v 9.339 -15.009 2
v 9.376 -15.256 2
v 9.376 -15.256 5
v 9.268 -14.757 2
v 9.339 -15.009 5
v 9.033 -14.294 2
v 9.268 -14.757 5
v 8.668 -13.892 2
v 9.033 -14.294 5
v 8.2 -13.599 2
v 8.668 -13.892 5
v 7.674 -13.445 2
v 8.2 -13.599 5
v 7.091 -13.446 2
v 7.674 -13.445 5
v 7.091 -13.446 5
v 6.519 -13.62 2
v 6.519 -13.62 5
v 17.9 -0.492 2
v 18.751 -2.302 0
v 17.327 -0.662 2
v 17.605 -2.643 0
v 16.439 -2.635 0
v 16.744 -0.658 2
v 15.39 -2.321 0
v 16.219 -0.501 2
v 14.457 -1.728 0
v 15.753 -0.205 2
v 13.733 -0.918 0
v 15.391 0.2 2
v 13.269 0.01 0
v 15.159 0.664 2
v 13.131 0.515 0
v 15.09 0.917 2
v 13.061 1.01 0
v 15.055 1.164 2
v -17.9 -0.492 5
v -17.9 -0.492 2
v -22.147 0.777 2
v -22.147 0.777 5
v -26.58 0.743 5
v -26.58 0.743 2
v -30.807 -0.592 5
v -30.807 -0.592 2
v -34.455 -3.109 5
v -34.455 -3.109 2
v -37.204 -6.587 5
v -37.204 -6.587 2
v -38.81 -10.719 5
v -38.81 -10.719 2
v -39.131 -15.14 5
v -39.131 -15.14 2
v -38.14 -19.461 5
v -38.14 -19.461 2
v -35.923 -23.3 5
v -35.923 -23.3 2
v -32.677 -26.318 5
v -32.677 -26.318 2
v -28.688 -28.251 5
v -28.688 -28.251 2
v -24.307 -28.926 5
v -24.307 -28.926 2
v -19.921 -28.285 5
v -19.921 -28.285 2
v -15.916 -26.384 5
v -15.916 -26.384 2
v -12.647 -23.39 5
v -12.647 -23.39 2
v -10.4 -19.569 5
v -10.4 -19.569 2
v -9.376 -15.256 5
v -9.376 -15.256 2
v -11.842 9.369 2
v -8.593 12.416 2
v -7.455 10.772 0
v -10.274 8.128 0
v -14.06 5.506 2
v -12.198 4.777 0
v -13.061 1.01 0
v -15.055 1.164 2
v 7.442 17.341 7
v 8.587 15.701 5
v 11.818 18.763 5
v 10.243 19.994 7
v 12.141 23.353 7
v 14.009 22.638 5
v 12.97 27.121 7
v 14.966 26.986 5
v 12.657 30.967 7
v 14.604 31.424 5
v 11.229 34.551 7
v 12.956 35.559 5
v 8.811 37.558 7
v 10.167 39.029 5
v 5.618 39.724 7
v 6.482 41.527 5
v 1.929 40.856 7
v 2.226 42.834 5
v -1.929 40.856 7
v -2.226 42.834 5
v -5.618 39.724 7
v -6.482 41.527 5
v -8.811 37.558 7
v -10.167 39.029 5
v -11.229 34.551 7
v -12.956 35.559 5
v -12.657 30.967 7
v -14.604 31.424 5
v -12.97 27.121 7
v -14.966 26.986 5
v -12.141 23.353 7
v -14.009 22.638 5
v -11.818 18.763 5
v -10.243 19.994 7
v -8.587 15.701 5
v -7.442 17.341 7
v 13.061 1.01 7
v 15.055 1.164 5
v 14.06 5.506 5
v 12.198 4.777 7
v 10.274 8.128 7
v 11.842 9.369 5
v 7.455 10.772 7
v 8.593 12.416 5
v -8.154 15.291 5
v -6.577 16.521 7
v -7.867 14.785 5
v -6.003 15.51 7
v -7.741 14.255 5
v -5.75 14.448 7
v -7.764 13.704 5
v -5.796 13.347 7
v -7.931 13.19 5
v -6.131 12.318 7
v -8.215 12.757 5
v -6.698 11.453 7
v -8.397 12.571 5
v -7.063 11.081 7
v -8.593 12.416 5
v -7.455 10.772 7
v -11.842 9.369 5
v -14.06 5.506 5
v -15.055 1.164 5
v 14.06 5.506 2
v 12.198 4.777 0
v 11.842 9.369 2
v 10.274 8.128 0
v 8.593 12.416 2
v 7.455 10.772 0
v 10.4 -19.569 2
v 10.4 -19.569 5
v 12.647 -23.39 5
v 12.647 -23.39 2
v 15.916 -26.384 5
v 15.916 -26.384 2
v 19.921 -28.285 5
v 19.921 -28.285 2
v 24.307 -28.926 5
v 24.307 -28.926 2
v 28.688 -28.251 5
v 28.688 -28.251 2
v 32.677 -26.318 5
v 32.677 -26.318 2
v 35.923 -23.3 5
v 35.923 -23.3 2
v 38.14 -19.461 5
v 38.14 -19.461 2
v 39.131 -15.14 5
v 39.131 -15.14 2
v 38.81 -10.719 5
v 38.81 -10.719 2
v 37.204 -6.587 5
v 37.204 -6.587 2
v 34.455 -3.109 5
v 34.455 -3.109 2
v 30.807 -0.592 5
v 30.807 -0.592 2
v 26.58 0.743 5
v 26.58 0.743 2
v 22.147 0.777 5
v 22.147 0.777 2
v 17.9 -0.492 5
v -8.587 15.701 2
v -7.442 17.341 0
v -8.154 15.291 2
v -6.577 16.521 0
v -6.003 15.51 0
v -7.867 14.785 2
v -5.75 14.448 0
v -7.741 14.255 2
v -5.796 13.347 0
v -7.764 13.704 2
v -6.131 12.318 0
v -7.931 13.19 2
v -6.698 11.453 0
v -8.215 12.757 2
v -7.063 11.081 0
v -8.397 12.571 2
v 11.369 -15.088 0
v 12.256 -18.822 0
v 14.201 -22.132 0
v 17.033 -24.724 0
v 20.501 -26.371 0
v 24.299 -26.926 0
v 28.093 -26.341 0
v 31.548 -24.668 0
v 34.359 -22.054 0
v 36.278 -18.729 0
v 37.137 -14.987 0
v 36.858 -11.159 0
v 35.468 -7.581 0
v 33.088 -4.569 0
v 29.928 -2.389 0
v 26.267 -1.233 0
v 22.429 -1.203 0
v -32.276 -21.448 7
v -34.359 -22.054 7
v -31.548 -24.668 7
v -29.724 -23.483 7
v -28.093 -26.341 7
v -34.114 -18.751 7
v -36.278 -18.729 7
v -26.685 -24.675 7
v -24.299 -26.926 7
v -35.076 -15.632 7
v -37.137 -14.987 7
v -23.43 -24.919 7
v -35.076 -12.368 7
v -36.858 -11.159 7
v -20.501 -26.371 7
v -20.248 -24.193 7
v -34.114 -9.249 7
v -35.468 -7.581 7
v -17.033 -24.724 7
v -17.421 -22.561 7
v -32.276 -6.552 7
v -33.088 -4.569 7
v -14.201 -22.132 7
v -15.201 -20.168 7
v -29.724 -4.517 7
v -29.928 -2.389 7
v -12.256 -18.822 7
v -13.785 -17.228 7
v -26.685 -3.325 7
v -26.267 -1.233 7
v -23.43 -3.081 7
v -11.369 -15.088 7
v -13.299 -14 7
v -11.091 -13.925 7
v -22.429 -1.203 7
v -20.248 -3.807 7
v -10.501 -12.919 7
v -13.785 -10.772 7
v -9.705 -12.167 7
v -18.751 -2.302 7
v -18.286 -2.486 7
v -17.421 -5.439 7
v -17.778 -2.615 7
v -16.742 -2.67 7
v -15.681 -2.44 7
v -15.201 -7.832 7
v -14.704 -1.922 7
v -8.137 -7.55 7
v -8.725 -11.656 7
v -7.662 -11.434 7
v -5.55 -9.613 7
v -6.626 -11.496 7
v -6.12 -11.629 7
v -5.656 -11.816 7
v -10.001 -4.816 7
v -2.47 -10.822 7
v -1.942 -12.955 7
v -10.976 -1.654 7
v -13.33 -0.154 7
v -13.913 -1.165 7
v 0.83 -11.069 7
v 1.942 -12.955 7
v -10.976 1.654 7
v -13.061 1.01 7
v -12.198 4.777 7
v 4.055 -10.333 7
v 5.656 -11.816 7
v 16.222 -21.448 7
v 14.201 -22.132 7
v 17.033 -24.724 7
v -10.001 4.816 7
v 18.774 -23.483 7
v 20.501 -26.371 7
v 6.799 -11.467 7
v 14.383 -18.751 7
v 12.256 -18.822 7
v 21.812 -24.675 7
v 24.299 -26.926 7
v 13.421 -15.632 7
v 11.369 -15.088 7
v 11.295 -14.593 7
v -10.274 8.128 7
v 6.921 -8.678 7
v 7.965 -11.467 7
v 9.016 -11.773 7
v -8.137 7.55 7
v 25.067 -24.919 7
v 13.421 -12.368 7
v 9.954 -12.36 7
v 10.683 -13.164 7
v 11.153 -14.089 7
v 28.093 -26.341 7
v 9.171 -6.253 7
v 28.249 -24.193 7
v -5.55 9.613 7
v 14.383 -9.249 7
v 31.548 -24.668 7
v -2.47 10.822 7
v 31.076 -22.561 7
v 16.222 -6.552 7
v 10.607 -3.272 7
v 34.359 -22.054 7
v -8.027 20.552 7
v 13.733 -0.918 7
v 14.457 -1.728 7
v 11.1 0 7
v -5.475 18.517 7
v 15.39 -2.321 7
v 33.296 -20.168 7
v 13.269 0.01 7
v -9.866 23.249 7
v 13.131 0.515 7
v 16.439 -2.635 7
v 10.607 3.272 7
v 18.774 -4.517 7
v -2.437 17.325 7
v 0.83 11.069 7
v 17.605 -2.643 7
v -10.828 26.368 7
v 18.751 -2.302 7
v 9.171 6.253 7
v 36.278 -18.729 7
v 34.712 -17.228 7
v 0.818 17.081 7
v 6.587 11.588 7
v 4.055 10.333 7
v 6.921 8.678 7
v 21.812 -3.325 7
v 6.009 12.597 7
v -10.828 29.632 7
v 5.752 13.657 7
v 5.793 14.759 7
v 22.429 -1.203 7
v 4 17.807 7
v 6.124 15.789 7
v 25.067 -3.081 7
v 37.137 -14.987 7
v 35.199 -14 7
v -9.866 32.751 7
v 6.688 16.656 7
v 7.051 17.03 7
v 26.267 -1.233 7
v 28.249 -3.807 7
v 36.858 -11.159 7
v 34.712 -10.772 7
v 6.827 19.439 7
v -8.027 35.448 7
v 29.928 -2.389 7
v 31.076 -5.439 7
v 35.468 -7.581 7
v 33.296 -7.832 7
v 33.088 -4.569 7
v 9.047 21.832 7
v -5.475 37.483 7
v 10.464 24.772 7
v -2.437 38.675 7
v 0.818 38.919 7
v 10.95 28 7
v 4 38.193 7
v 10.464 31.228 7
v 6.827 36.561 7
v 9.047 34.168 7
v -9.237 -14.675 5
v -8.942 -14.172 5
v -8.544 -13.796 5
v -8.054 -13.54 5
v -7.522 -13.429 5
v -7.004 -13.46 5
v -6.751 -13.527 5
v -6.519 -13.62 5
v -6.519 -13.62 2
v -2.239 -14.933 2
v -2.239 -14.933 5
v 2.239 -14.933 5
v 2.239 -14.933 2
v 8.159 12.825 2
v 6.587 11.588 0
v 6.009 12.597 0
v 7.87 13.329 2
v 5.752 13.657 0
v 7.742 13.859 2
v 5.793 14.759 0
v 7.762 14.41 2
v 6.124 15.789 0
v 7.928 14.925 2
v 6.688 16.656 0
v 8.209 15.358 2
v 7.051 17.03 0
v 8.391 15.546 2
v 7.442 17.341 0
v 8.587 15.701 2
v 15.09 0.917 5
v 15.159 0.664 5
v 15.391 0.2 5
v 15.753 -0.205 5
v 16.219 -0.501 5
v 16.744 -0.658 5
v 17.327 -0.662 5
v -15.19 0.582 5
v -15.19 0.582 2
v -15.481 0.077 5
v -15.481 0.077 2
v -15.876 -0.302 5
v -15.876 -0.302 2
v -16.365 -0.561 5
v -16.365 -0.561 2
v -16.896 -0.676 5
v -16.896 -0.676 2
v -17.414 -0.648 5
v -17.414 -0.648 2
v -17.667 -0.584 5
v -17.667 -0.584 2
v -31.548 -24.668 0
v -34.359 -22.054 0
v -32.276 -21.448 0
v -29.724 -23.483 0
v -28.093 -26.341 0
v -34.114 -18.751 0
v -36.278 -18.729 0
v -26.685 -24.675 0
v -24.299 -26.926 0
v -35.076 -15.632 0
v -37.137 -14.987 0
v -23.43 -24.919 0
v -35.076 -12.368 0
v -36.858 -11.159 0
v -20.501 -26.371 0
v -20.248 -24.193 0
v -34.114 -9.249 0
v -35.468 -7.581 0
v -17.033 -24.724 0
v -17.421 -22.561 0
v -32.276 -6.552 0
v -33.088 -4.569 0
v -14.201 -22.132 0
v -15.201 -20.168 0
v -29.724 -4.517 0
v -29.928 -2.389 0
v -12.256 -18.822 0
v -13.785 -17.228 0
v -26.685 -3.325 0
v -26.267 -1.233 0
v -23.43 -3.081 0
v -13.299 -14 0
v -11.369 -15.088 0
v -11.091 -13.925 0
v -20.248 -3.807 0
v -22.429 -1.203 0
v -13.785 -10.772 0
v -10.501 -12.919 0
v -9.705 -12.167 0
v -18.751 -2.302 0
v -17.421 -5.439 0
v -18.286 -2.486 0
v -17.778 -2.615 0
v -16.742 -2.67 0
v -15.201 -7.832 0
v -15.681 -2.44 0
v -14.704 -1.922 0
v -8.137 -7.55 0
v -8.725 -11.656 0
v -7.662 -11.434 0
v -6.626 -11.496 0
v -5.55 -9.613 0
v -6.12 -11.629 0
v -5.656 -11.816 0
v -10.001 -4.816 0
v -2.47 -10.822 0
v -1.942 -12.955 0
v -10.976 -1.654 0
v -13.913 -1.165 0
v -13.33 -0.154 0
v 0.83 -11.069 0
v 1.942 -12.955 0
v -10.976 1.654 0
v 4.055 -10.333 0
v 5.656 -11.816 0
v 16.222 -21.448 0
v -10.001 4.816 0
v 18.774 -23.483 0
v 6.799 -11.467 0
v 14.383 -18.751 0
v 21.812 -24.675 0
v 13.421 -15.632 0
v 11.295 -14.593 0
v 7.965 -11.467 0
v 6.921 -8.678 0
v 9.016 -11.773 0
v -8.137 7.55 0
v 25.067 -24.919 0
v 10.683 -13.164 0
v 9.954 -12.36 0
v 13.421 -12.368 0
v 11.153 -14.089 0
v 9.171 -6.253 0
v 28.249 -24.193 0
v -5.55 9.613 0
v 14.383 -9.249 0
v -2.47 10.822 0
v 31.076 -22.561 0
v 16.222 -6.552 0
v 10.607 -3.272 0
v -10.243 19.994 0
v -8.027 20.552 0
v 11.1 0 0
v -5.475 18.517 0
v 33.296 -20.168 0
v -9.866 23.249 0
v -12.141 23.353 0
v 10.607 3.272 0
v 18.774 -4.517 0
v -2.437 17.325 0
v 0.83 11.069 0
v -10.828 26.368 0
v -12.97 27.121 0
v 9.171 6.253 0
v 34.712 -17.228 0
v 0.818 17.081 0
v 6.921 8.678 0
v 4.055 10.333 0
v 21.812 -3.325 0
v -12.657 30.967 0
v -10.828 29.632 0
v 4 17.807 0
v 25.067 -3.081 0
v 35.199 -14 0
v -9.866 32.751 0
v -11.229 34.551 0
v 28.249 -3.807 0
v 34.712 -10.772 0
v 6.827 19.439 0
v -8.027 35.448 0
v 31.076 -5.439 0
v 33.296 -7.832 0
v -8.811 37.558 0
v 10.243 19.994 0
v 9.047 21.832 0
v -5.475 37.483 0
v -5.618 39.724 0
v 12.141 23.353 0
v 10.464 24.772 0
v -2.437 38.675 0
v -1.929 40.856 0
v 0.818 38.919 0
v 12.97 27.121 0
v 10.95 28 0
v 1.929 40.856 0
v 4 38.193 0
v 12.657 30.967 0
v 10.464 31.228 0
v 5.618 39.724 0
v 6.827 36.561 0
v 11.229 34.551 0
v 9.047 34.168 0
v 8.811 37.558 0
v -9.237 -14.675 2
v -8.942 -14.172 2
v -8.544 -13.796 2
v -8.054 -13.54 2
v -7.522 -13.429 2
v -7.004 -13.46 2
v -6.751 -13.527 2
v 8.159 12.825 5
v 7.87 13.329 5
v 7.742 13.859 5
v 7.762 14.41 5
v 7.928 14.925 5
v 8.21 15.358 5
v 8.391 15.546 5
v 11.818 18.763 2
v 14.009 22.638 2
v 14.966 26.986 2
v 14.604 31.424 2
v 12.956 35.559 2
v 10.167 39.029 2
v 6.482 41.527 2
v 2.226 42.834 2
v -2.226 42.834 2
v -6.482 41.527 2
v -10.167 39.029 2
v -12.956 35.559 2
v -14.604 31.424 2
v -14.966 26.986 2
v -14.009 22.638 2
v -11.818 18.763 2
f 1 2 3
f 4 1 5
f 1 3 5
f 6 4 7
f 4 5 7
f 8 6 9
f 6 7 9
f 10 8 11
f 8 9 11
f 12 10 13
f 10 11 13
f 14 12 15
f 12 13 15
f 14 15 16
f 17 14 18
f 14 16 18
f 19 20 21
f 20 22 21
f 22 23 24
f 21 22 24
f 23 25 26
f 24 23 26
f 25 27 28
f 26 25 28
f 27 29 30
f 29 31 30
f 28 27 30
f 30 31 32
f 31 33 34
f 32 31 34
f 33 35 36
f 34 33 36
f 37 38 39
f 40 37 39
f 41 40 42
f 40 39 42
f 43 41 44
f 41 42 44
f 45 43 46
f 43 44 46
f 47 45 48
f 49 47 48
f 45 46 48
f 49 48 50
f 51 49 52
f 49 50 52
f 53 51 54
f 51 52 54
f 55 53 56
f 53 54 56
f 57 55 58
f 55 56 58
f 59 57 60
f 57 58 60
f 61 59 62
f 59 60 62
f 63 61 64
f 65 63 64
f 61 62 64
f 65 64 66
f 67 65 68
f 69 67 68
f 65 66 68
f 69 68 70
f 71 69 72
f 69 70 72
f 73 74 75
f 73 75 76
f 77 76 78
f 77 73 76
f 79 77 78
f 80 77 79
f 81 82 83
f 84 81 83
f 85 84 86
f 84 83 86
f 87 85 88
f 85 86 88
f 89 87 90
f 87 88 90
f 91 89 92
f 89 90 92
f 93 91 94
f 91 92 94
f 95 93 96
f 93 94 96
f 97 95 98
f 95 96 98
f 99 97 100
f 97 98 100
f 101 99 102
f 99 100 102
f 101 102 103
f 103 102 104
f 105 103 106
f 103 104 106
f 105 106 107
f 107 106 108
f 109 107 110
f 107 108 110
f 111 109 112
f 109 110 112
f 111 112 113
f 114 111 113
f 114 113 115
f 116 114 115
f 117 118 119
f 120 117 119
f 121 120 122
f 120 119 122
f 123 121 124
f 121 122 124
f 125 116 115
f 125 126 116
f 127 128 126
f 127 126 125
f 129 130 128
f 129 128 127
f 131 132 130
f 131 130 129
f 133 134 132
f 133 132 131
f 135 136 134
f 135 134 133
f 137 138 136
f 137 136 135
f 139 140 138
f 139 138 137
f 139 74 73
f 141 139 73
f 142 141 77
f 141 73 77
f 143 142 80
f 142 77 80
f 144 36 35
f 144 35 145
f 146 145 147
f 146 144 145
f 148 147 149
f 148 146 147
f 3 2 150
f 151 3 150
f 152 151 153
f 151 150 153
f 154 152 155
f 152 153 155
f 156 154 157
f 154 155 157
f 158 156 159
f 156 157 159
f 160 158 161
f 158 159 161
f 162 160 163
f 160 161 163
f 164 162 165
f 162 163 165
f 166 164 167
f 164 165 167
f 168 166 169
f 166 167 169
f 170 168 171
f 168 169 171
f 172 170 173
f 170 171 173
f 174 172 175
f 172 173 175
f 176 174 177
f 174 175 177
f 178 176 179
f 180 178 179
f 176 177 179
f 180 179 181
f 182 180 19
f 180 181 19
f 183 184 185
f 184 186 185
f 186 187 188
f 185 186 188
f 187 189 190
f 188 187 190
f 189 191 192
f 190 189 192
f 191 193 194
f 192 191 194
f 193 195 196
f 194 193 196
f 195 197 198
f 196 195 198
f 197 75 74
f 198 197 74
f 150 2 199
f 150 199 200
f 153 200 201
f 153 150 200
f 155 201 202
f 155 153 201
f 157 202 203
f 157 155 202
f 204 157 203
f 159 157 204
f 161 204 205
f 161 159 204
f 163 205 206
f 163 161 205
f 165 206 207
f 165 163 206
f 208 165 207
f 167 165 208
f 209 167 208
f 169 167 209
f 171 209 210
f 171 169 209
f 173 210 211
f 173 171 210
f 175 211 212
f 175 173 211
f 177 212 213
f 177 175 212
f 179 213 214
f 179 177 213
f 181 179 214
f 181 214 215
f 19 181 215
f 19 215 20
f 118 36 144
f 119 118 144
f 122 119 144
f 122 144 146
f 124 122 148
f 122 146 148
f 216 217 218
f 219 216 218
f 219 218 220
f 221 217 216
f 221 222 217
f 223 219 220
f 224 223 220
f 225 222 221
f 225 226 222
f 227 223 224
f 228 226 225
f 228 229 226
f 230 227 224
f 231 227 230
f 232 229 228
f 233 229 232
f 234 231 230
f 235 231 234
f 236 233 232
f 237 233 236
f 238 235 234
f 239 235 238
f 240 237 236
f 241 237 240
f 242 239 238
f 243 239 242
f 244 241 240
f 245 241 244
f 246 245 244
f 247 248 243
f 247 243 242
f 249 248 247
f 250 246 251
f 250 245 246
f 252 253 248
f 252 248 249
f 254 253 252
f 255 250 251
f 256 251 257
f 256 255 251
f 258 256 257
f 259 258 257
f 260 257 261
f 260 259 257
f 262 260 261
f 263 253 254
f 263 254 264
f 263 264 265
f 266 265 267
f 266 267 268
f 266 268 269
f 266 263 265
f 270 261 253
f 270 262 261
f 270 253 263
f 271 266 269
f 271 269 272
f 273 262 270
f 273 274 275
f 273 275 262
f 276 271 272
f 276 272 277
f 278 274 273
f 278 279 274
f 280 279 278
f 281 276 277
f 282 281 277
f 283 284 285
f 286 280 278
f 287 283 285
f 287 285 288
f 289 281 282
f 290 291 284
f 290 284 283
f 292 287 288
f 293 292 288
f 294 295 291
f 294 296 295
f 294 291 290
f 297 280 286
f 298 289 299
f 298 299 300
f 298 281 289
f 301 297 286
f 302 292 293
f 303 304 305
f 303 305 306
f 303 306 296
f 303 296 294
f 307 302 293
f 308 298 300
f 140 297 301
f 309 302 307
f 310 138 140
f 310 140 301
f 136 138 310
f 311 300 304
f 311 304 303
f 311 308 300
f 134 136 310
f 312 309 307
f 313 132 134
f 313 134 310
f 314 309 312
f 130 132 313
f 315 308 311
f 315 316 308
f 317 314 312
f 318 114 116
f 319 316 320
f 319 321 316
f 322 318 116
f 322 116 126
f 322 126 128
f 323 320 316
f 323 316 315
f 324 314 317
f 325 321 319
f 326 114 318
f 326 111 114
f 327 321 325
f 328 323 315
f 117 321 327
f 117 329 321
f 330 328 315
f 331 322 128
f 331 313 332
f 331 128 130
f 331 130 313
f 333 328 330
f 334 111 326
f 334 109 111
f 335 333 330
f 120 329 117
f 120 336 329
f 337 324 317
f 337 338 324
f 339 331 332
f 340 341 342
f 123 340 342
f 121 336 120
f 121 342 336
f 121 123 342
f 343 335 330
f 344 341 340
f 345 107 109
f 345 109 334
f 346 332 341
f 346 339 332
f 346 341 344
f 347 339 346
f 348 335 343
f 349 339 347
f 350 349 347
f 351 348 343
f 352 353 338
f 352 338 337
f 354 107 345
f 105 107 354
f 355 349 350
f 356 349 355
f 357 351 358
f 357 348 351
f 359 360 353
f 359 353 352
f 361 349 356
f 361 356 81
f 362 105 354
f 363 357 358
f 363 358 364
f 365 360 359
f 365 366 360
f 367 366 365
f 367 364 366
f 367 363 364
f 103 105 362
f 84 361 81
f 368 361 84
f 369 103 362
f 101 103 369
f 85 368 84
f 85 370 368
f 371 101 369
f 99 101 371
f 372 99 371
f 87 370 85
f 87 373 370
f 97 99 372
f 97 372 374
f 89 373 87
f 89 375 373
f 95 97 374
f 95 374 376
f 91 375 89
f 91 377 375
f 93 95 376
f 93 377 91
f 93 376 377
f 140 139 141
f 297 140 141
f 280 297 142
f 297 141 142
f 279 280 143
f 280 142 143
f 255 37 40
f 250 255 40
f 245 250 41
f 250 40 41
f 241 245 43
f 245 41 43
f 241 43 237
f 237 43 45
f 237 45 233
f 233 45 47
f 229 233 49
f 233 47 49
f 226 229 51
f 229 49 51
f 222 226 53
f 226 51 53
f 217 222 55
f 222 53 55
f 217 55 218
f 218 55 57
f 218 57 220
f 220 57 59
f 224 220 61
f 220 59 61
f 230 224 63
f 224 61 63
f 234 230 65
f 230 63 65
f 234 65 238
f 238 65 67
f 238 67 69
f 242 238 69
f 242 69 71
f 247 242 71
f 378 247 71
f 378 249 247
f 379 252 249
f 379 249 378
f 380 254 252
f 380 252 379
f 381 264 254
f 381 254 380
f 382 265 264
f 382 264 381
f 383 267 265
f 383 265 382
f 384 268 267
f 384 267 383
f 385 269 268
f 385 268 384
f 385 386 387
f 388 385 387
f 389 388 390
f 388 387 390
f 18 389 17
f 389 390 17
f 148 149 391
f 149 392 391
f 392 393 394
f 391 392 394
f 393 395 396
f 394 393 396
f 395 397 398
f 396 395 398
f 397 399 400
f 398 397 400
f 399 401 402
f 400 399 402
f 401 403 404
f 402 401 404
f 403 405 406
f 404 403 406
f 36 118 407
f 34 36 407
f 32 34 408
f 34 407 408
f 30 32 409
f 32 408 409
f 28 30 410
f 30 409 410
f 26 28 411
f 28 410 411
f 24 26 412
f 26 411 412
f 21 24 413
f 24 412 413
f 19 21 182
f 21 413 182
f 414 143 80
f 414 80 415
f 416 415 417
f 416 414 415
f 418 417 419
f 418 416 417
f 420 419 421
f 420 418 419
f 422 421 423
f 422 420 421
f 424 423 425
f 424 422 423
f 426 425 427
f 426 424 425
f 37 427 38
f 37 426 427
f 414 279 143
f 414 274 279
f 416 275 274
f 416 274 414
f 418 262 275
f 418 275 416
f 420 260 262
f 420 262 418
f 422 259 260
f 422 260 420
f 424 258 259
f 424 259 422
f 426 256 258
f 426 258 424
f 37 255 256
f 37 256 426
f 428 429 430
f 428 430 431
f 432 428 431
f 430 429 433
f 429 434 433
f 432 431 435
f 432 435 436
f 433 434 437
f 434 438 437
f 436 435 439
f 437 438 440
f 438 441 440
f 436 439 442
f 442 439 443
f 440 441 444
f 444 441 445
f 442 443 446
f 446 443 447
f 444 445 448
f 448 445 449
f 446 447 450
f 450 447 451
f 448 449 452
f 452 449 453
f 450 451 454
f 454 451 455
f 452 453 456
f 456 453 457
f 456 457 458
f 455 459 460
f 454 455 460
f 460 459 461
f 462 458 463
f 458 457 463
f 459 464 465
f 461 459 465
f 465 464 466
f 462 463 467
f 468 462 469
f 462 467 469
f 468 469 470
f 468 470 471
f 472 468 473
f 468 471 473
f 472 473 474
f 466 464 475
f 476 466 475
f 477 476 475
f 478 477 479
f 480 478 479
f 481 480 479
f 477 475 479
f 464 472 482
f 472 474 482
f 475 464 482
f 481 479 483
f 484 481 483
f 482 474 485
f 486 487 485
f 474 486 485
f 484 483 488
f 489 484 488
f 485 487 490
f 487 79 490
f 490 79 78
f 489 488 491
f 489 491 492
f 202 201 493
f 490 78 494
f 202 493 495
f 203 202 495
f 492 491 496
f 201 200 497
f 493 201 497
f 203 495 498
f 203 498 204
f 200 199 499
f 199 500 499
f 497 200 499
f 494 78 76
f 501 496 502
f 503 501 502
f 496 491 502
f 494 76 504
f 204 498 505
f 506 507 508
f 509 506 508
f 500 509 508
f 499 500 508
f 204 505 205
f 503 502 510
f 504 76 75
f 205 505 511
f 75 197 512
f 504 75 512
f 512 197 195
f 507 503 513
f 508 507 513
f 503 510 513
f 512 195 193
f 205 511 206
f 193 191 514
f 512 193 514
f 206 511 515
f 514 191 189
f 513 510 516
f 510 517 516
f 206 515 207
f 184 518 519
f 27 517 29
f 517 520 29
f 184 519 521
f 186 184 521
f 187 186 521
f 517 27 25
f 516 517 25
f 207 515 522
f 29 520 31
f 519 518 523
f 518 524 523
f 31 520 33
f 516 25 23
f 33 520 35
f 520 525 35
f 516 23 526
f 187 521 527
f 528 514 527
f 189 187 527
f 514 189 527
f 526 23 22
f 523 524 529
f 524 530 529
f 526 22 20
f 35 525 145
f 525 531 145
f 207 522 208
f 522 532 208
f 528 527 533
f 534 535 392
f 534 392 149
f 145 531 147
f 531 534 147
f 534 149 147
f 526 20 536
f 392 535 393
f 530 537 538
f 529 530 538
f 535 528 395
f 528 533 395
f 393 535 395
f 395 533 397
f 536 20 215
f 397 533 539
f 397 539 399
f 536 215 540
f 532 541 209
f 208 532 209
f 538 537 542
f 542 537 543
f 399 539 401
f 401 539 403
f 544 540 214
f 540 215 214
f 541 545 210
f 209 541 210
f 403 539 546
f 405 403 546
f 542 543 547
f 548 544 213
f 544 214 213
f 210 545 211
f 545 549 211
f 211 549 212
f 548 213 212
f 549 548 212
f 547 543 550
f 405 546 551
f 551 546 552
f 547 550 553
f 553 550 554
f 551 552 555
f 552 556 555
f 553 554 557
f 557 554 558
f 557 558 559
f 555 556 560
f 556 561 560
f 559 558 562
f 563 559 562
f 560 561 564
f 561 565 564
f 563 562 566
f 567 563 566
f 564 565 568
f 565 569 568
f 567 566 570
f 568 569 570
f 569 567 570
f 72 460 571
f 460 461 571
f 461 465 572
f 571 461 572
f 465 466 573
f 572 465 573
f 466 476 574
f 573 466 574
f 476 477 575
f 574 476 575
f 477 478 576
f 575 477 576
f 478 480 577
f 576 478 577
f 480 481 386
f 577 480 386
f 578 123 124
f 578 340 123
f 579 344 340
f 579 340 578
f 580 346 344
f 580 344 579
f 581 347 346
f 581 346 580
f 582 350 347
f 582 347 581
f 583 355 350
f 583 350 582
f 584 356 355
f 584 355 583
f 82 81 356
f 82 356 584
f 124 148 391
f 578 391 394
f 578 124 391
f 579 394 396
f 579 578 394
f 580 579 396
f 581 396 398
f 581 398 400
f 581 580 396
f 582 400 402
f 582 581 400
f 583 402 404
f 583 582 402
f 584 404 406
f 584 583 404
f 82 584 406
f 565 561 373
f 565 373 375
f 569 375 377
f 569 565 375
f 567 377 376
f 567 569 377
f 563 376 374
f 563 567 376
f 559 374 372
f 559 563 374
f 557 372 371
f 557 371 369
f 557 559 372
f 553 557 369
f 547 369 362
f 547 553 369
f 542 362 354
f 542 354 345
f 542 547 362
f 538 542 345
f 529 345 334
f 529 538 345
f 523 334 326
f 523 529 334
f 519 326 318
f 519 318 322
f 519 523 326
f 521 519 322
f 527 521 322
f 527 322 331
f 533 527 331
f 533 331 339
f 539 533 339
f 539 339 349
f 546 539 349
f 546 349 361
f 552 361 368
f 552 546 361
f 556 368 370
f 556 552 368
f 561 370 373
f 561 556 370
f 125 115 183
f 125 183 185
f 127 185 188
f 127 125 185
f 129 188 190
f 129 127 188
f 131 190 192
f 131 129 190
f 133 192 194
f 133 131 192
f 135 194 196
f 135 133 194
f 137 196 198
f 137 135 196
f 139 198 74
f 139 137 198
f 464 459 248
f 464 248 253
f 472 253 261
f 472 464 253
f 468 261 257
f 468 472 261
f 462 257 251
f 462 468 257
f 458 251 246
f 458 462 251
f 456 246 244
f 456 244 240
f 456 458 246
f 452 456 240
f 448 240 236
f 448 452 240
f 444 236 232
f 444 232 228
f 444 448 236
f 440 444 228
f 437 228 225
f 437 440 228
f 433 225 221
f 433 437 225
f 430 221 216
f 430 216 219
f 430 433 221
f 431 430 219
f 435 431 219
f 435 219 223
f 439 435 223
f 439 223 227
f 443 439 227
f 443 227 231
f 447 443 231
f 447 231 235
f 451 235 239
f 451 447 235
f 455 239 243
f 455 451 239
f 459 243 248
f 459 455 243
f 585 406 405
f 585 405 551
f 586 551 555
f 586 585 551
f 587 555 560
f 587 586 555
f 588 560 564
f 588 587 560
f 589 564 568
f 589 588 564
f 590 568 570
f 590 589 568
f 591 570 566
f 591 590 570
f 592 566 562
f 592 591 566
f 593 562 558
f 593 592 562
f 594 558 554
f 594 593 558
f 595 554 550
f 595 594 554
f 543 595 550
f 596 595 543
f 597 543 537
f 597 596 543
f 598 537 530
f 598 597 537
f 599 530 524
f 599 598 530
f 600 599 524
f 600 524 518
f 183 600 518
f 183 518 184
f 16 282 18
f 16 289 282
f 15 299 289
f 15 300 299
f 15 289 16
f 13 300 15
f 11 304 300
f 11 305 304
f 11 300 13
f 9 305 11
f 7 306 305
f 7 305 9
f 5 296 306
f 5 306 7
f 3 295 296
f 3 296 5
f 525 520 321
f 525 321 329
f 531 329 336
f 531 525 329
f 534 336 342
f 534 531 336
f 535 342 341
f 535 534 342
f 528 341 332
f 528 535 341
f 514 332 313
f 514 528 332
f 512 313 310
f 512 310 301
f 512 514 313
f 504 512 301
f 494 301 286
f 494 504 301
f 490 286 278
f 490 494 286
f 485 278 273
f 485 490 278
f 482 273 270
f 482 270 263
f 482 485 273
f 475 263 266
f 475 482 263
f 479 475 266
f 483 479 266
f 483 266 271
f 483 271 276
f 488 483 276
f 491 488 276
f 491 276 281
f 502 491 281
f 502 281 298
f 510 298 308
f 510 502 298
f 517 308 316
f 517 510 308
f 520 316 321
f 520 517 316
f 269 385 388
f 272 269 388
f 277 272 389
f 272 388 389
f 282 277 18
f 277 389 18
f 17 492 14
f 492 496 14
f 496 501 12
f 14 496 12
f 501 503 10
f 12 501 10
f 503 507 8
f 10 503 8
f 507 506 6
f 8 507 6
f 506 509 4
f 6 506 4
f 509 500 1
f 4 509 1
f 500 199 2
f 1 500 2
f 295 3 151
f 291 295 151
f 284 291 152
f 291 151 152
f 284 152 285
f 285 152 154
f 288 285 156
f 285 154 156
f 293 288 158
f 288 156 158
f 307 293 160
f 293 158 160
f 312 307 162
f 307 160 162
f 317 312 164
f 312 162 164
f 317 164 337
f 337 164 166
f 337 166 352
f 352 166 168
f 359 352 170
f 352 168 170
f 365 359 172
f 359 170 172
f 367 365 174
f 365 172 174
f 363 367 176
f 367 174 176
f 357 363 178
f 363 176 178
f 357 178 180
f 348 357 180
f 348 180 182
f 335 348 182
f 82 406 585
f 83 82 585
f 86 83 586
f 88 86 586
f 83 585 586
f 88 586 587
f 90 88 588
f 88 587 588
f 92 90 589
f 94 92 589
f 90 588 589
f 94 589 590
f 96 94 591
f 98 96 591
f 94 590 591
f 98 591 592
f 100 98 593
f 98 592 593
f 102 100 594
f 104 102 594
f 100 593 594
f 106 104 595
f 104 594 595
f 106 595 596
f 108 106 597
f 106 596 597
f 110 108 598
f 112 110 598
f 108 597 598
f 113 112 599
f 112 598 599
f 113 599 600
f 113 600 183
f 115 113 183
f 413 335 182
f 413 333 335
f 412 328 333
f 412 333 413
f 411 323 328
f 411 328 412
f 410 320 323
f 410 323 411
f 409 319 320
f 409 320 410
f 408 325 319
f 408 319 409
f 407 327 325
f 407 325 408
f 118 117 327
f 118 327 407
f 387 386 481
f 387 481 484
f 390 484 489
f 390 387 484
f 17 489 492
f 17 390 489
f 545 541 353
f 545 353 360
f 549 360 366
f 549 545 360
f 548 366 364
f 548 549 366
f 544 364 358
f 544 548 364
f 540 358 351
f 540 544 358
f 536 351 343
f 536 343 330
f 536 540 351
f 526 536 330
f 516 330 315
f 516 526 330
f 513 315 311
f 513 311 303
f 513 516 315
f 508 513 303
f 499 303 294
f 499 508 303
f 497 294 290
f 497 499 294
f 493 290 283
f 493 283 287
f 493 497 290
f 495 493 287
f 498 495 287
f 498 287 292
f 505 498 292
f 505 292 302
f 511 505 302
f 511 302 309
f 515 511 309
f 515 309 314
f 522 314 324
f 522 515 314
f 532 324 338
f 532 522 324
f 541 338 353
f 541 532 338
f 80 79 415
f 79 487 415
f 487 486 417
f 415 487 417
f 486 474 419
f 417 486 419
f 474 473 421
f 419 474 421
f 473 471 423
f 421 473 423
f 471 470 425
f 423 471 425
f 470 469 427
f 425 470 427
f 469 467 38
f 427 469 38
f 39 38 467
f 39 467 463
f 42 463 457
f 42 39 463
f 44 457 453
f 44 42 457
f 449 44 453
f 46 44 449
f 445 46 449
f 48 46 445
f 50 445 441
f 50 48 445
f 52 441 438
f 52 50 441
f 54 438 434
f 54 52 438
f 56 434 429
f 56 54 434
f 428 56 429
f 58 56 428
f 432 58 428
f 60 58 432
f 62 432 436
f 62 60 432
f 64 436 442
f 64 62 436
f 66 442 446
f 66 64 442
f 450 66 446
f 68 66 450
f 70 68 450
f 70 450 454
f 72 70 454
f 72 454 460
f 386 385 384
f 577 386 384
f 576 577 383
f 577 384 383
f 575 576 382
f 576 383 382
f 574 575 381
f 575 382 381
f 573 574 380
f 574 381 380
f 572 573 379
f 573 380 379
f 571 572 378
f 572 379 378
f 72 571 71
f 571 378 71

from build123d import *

# Parameters (mm, degrees)
F0_R     = 10.95
F0_R_2   = 11.1
F1_DEPTH = 7
F2_R     = 2
F3_SIZE  = 2


with BuildPart() as f1:
    # F0 (on Top) → F1 (new body)
    with BuildSketch(Plane.XY):
        with BuildLine():
            ThreePointArc((14.915718, -2.351886), (13.104206, 7.502653), (5.522872, 14.05375))
            ThreePointArc((5.522872, 14.05375), (0, 43), (-5.522872, 14.05375))
            ThreePointArc((-5.522872, 14.05375), (-13.104206, 7.502653), (-14.915718, -2.351886))
            ThreePointArc((-14.915718, -2.351886), (-37.174944, -21.462964), (-9.494652, -11.741447))
            ThreePointArc((-9.494652, -11.741447), (0, -15.1), (9.494652, -11.741447))
            ThreePointArc((9.494652, -11.741447), (37.174944, -21.462964), (14.915718, -2.351886))
        make_face()
        with Locations((-24.248711, -14)):
            Circle(F0_R, mode=Mode.SUBTRACT)
        with Locations((24.248711, -14)):
            Circle(F0_R, mode=Mode.SUBTRACT)
        Circle(F0_R_2, mode=Mode.SUBTRACT)
        with Locations((0, 28)):
            Circle(F0_R, mode=Mode.SUBTRACT)
    extrude(amount=F1_DEPTH)

    # F2
    f2_edges = [f1.edges().sort_by_distance(p)[0] for p in [
        (-9.494652, -11.741447, 3.5),
        (9.494652, -11.741447, 3.5),
        (14.915718, -2.351886, 3.5),
        (5.522872, 14.05375, 3.5),
        (-5.522872, 14.05375, 3.5),
        (-14.915718, -2.351886, 3.5),
    ]]
    fillet(f2_edges, radius=F2_R)

    # F3
    f3_edges = [f1.edges().sort_by_distance(p)[0] for p in [
        (37.174944, -21.462964, 0),
        (37.174944, -21.462964, 7),
    ]]
    chamfer(f3_edges, length=F3_SIZE)


solid = f1.part
